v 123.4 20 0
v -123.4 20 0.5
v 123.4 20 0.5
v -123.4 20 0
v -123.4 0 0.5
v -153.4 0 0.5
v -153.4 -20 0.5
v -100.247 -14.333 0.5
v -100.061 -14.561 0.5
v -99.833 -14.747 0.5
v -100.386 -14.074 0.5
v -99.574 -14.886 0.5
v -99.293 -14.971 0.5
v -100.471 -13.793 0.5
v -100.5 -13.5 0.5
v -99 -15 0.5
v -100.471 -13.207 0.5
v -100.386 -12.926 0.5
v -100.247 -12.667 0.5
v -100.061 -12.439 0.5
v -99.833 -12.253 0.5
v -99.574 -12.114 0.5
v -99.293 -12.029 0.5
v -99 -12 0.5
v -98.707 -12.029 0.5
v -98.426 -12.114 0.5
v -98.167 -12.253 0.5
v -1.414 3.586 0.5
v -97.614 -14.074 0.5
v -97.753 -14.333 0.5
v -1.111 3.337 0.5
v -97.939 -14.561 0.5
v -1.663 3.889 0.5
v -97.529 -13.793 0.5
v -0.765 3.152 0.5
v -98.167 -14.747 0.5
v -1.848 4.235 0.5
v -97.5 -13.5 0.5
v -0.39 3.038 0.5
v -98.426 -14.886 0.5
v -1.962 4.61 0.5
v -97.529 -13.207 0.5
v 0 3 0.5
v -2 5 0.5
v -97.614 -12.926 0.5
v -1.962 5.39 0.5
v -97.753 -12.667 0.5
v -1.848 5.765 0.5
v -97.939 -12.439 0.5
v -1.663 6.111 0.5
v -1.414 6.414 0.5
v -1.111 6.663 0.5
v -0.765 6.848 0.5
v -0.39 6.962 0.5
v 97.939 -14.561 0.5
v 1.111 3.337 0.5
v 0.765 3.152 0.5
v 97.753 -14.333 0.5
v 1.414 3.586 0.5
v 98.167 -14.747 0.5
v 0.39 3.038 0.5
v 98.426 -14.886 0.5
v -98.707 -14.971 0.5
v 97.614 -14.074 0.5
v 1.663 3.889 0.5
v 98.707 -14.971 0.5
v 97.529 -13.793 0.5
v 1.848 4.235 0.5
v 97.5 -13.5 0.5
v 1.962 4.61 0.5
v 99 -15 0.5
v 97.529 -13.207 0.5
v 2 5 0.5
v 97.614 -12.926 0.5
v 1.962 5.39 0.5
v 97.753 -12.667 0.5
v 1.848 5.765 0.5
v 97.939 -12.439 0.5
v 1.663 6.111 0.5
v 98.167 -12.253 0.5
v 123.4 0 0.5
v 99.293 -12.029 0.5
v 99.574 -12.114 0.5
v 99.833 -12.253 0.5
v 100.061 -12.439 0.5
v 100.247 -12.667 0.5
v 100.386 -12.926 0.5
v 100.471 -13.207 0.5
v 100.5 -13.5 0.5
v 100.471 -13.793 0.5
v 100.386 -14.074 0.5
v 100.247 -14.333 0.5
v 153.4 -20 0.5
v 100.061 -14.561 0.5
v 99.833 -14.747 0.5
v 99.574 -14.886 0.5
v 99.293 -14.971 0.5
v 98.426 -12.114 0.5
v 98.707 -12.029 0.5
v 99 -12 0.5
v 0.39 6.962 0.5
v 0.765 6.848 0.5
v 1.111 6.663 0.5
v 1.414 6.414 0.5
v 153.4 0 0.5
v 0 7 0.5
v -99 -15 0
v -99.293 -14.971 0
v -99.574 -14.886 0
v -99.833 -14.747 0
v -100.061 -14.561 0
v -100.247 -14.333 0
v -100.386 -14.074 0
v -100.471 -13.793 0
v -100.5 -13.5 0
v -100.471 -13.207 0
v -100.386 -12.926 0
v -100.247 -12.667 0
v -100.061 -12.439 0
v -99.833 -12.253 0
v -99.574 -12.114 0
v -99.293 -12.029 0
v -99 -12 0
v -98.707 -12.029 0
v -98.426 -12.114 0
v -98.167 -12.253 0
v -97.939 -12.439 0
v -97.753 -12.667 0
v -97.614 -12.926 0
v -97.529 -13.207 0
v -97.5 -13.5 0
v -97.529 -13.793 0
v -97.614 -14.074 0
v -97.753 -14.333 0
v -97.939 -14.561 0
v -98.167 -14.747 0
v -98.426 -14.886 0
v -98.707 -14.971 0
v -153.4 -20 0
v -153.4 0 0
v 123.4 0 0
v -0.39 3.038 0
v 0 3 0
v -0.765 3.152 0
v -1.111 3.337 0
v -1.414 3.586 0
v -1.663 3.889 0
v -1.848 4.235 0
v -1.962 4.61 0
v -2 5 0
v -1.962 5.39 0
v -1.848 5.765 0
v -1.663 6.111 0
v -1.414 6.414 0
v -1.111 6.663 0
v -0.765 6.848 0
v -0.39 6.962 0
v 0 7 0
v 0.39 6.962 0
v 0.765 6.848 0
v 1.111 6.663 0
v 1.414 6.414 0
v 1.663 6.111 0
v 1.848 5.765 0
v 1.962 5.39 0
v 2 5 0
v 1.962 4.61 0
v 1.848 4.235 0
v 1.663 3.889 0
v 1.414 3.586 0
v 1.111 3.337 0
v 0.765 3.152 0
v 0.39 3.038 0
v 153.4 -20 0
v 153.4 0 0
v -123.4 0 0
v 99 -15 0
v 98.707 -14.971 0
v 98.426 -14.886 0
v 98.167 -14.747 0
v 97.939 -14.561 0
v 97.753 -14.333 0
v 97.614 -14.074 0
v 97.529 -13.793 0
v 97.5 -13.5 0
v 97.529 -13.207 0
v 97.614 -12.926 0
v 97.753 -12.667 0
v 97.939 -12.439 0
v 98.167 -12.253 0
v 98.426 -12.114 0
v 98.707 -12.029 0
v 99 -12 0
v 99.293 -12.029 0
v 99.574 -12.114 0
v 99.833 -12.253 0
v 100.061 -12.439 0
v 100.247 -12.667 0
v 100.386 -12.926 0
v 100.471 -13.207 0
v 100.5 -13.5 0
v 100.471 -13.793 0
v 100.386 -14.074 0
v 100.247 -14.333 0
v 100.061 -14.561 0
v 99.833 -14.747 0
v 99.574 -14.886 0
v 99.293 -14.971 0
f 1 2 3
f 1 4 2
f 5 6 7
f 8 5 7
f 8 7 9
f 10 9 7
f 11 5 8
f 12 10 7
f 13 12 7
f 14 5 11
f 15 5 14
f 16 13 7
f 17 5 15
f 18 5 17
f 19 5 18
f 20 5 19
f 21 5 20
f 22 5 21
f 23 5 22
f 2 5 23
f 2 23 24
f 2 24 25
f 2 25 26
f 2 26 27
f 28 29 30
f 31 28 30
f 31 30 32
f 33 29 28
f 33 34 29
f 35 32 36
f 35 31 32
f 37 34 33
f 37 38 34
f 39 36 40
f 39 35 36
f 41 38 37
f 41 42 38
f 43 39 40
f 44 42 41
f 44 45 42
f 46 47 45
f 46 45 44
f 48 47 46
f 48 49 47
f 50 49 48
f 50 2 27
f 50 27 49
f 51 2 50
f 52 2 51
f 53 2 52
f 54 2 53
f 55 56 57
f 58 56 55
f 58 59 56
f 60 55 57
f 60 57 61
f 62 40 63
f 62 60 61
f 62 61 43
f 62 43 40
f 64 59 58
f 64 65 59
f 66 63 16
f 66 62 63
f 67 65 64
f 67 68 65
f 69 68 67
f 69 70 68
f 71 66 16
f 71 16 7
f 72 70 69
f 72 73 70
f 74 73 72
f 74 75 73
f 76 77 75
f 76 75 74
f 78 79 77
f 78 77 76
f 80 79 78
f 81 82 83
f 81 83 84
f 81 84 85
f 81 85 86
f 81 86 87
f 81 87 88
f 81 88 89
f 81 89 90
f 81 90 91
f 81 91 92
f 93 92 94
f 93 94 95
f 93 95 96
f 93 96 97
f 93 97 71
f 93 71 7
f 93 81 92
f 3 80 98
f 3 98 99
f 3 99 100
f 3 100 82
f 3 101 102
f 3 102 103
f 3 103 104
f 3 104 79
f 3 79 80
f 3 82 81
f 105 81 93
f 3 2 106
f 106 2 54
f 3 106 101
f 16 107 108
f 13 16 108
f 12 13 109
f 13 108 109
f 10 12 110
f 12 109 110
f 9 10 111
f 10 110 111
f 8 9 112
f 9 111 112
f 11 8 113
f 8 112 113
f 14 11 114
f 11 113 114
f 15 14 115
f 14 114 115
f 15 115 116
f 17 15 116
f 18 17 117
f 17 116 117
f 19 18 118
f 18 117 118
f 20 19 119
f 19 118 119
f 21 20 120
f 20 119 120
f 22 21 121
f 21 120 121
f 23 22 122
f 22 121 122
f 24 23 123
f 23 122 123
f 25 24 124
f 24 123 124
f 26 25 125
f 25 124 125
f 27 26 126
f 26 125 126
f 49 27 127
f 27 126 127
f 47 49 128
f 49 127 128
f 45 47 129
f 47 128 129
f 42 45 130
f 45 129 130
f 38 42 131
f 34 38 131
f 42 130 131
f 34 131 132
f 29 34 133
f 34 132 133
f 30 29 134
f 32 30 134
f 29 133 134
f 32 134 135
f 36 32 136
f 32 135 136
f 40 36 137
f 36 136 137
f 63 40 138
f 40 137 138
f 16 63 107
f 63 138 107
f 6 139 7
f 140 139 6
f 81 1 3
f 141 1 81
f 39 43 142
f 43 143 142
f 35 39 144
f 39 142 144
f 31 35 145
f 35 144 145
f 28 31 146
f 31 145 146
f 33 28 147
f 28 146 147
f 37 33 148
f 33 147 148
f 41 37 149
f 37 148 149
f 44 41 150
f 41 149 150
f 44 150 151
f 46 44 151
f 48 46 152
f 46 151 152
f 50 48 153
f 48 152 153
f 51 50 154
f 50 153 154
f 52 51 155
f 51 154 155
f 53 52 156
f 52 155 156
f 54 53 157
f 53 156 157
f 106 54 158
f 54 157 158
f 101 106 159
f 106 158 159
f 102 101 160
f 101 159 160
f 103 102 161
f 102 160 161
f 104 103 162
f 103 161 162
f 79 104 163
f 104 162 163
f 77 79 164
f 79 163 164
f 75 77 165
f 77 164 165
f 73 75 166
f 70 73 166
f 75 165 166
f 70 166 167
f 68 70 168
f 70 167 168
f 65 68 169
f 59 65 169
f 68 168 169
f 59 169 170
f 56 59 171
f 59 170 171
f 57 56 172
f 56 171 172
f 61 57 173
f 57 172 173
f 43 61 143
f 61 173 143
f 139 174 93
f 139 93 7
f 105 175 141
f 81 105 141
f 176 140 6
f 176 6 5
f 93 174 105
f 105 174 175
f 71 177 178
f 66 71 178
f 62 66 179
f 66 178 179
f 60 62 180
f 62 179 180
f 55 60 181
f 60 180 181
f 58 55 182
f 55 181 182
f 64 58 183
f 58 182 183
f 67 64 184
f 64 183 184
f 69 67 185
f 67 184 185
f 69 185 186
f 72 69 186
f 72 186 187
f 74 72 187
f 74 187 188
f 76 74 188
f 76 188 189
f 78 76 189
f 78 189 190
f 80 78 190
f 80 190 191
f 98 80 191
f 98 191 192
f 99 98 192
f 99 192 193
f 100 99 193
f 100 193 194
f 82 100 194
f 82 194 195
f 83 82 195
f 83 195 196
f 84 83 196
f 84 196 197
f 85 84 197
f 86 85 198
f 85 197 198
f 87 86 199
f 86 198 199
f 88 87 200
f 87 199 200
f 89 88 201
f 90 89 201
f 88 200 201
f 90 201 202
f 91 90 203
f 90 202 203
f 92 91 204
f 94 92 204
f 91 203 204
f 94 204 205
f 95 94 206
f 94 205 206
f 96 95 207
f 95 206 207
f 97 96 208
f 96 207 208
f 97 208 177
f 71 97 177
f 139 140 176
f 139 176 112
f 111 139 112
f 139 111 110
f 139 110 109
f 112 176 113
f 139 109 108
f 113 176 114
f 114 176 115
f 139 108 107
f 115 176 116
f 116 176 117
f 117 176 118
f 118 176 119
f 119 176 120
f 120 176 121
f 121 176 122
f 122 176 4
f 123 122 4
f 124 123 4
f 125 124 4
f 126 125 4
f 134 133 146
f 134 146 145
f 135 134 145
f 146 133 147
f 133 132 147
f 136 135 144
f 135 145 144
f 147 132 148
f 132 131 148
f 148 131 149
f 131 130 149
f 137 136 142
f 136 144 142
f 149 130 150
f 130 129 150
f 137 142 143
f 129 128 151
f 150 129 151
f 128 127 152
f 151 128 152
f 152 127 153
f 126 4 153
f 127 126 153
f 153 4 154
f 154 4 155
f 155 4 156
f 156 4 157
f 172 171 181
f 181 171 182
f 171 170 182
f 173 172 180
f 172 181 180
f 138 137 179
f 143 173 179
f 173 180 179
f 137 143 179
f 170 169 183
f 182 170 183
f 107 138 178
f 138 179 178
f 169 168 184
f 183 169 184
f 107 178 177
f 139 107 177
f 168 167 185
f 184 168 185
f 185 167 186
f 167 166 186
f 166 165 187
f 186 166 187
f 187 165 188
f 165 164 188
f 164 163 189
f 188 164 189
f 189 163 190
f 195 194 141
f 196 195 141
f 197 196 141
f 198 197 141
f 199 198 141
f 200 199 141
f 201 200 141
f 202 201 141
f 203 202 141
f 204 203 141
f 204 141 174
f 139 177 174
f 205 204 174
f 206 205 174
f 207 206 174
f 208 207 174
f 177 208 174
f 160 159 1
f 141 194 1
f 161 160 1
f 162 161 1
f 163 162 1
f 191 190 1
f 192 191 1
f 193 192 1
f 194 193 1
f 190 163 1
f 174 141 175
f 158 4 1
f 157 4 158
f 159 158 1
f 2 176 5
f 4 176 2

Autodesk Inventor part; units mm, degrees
ref_plane "YZ Plane" through (0, 0, 0) normal (1, 0, 0) x (0, 1, 0)
ref_plane "XZ Plane" through (0, 0, 0) normal (0, 1, 0) x (-1, 0, 0)
ref_plane "XY Plane" through (0, 0, 0) normal (0, 0, 1) x (1, 0, 0)
sketch "Esboço1" plane through (0, 0, 0) normal (0, 0, 1) x (1, 0, 0)
  line L0 (123.4, -20) -> (-123.4, -20)
  line L1 (-123.4, -20) -> (-123.4, 20)
  line L2 (-123.4, 20) -> (123.4, 20)
  line L3 (123.4, 20) -> (123.4, -20)
  line L4 (123.4, -20) -> (-123.4, 20) construction
  line L5 (-123.4, -20) -> (123.4, 20) construction
  line L6 (-123.4, -20) -> (-153.4, -20)
  line L7 (-153.4, -20) -> (-153.4, 0)
  line L8 (-153.4, 0) -> (-123.4, 0)
  line L9 (-123.4, 0) -> (-123.4, -20)
  line L10 (123.4, -20) -> (153.4, -20)
  line L11 (153.4, -20) -> (153.4, 0)
  line L12 (153.4, 0) -> (123.4, 0)
  line L13 (123.4, 0) -> (123.4, -20)
  point P0 (0, 0)
  dimension "d0" = 246.8
  dimension "d1" = 40
  dimension "d2" = 30
  dimension "d3" = 20
  dimension "d4" = 30
  dimension "d5" = 20
extrude "Placa1" add sketch "Esboço1" along normal blind 0.5
hole "Furo1" at (0, 5, 0.5) direction (0, 0, -1) diameter 4 depth 0.5 tip angle 118
hole "Furo2" at (-99, -13.5, 0.5) direction (0, 0, -1) diameter 3 depth 0.5 tip angle 118
hole "Furo3" at (99, -13.5, 0.5) direction (0, 0, -1) diameter 3 end through all
equation "\"d14\" = Espessura"
equation "\"d23\" = Espessura"
equation "\"d33\" = Espessura"
equation "\"d6\" = Espessura"
equation "\"Raio_vergadura\" = Espessura"
equation "\"Largura_alívio_de_vergadura\" = Espessura"
equation "\"Profundidade_alívio_de_vergadura\" = 0.5 * Espessura"
equation "\"Tamanho_alívio_de_dobra\" = 4 * Espessura"
equation "\"Remanescente_mínimo\" = 2 * Espessura"
equation "\"Raiodetransição\" = Raio_vergadura"
equation "\"Tamanho_de_raio_de_Jacobi\" = Raio_vergadura"
equation "\"TamanhoFolga\" = Espessura"
equation "\"Espessura\" = 0.5"
properties part number "Tampa Gaveta" material "PMMA plástico"
